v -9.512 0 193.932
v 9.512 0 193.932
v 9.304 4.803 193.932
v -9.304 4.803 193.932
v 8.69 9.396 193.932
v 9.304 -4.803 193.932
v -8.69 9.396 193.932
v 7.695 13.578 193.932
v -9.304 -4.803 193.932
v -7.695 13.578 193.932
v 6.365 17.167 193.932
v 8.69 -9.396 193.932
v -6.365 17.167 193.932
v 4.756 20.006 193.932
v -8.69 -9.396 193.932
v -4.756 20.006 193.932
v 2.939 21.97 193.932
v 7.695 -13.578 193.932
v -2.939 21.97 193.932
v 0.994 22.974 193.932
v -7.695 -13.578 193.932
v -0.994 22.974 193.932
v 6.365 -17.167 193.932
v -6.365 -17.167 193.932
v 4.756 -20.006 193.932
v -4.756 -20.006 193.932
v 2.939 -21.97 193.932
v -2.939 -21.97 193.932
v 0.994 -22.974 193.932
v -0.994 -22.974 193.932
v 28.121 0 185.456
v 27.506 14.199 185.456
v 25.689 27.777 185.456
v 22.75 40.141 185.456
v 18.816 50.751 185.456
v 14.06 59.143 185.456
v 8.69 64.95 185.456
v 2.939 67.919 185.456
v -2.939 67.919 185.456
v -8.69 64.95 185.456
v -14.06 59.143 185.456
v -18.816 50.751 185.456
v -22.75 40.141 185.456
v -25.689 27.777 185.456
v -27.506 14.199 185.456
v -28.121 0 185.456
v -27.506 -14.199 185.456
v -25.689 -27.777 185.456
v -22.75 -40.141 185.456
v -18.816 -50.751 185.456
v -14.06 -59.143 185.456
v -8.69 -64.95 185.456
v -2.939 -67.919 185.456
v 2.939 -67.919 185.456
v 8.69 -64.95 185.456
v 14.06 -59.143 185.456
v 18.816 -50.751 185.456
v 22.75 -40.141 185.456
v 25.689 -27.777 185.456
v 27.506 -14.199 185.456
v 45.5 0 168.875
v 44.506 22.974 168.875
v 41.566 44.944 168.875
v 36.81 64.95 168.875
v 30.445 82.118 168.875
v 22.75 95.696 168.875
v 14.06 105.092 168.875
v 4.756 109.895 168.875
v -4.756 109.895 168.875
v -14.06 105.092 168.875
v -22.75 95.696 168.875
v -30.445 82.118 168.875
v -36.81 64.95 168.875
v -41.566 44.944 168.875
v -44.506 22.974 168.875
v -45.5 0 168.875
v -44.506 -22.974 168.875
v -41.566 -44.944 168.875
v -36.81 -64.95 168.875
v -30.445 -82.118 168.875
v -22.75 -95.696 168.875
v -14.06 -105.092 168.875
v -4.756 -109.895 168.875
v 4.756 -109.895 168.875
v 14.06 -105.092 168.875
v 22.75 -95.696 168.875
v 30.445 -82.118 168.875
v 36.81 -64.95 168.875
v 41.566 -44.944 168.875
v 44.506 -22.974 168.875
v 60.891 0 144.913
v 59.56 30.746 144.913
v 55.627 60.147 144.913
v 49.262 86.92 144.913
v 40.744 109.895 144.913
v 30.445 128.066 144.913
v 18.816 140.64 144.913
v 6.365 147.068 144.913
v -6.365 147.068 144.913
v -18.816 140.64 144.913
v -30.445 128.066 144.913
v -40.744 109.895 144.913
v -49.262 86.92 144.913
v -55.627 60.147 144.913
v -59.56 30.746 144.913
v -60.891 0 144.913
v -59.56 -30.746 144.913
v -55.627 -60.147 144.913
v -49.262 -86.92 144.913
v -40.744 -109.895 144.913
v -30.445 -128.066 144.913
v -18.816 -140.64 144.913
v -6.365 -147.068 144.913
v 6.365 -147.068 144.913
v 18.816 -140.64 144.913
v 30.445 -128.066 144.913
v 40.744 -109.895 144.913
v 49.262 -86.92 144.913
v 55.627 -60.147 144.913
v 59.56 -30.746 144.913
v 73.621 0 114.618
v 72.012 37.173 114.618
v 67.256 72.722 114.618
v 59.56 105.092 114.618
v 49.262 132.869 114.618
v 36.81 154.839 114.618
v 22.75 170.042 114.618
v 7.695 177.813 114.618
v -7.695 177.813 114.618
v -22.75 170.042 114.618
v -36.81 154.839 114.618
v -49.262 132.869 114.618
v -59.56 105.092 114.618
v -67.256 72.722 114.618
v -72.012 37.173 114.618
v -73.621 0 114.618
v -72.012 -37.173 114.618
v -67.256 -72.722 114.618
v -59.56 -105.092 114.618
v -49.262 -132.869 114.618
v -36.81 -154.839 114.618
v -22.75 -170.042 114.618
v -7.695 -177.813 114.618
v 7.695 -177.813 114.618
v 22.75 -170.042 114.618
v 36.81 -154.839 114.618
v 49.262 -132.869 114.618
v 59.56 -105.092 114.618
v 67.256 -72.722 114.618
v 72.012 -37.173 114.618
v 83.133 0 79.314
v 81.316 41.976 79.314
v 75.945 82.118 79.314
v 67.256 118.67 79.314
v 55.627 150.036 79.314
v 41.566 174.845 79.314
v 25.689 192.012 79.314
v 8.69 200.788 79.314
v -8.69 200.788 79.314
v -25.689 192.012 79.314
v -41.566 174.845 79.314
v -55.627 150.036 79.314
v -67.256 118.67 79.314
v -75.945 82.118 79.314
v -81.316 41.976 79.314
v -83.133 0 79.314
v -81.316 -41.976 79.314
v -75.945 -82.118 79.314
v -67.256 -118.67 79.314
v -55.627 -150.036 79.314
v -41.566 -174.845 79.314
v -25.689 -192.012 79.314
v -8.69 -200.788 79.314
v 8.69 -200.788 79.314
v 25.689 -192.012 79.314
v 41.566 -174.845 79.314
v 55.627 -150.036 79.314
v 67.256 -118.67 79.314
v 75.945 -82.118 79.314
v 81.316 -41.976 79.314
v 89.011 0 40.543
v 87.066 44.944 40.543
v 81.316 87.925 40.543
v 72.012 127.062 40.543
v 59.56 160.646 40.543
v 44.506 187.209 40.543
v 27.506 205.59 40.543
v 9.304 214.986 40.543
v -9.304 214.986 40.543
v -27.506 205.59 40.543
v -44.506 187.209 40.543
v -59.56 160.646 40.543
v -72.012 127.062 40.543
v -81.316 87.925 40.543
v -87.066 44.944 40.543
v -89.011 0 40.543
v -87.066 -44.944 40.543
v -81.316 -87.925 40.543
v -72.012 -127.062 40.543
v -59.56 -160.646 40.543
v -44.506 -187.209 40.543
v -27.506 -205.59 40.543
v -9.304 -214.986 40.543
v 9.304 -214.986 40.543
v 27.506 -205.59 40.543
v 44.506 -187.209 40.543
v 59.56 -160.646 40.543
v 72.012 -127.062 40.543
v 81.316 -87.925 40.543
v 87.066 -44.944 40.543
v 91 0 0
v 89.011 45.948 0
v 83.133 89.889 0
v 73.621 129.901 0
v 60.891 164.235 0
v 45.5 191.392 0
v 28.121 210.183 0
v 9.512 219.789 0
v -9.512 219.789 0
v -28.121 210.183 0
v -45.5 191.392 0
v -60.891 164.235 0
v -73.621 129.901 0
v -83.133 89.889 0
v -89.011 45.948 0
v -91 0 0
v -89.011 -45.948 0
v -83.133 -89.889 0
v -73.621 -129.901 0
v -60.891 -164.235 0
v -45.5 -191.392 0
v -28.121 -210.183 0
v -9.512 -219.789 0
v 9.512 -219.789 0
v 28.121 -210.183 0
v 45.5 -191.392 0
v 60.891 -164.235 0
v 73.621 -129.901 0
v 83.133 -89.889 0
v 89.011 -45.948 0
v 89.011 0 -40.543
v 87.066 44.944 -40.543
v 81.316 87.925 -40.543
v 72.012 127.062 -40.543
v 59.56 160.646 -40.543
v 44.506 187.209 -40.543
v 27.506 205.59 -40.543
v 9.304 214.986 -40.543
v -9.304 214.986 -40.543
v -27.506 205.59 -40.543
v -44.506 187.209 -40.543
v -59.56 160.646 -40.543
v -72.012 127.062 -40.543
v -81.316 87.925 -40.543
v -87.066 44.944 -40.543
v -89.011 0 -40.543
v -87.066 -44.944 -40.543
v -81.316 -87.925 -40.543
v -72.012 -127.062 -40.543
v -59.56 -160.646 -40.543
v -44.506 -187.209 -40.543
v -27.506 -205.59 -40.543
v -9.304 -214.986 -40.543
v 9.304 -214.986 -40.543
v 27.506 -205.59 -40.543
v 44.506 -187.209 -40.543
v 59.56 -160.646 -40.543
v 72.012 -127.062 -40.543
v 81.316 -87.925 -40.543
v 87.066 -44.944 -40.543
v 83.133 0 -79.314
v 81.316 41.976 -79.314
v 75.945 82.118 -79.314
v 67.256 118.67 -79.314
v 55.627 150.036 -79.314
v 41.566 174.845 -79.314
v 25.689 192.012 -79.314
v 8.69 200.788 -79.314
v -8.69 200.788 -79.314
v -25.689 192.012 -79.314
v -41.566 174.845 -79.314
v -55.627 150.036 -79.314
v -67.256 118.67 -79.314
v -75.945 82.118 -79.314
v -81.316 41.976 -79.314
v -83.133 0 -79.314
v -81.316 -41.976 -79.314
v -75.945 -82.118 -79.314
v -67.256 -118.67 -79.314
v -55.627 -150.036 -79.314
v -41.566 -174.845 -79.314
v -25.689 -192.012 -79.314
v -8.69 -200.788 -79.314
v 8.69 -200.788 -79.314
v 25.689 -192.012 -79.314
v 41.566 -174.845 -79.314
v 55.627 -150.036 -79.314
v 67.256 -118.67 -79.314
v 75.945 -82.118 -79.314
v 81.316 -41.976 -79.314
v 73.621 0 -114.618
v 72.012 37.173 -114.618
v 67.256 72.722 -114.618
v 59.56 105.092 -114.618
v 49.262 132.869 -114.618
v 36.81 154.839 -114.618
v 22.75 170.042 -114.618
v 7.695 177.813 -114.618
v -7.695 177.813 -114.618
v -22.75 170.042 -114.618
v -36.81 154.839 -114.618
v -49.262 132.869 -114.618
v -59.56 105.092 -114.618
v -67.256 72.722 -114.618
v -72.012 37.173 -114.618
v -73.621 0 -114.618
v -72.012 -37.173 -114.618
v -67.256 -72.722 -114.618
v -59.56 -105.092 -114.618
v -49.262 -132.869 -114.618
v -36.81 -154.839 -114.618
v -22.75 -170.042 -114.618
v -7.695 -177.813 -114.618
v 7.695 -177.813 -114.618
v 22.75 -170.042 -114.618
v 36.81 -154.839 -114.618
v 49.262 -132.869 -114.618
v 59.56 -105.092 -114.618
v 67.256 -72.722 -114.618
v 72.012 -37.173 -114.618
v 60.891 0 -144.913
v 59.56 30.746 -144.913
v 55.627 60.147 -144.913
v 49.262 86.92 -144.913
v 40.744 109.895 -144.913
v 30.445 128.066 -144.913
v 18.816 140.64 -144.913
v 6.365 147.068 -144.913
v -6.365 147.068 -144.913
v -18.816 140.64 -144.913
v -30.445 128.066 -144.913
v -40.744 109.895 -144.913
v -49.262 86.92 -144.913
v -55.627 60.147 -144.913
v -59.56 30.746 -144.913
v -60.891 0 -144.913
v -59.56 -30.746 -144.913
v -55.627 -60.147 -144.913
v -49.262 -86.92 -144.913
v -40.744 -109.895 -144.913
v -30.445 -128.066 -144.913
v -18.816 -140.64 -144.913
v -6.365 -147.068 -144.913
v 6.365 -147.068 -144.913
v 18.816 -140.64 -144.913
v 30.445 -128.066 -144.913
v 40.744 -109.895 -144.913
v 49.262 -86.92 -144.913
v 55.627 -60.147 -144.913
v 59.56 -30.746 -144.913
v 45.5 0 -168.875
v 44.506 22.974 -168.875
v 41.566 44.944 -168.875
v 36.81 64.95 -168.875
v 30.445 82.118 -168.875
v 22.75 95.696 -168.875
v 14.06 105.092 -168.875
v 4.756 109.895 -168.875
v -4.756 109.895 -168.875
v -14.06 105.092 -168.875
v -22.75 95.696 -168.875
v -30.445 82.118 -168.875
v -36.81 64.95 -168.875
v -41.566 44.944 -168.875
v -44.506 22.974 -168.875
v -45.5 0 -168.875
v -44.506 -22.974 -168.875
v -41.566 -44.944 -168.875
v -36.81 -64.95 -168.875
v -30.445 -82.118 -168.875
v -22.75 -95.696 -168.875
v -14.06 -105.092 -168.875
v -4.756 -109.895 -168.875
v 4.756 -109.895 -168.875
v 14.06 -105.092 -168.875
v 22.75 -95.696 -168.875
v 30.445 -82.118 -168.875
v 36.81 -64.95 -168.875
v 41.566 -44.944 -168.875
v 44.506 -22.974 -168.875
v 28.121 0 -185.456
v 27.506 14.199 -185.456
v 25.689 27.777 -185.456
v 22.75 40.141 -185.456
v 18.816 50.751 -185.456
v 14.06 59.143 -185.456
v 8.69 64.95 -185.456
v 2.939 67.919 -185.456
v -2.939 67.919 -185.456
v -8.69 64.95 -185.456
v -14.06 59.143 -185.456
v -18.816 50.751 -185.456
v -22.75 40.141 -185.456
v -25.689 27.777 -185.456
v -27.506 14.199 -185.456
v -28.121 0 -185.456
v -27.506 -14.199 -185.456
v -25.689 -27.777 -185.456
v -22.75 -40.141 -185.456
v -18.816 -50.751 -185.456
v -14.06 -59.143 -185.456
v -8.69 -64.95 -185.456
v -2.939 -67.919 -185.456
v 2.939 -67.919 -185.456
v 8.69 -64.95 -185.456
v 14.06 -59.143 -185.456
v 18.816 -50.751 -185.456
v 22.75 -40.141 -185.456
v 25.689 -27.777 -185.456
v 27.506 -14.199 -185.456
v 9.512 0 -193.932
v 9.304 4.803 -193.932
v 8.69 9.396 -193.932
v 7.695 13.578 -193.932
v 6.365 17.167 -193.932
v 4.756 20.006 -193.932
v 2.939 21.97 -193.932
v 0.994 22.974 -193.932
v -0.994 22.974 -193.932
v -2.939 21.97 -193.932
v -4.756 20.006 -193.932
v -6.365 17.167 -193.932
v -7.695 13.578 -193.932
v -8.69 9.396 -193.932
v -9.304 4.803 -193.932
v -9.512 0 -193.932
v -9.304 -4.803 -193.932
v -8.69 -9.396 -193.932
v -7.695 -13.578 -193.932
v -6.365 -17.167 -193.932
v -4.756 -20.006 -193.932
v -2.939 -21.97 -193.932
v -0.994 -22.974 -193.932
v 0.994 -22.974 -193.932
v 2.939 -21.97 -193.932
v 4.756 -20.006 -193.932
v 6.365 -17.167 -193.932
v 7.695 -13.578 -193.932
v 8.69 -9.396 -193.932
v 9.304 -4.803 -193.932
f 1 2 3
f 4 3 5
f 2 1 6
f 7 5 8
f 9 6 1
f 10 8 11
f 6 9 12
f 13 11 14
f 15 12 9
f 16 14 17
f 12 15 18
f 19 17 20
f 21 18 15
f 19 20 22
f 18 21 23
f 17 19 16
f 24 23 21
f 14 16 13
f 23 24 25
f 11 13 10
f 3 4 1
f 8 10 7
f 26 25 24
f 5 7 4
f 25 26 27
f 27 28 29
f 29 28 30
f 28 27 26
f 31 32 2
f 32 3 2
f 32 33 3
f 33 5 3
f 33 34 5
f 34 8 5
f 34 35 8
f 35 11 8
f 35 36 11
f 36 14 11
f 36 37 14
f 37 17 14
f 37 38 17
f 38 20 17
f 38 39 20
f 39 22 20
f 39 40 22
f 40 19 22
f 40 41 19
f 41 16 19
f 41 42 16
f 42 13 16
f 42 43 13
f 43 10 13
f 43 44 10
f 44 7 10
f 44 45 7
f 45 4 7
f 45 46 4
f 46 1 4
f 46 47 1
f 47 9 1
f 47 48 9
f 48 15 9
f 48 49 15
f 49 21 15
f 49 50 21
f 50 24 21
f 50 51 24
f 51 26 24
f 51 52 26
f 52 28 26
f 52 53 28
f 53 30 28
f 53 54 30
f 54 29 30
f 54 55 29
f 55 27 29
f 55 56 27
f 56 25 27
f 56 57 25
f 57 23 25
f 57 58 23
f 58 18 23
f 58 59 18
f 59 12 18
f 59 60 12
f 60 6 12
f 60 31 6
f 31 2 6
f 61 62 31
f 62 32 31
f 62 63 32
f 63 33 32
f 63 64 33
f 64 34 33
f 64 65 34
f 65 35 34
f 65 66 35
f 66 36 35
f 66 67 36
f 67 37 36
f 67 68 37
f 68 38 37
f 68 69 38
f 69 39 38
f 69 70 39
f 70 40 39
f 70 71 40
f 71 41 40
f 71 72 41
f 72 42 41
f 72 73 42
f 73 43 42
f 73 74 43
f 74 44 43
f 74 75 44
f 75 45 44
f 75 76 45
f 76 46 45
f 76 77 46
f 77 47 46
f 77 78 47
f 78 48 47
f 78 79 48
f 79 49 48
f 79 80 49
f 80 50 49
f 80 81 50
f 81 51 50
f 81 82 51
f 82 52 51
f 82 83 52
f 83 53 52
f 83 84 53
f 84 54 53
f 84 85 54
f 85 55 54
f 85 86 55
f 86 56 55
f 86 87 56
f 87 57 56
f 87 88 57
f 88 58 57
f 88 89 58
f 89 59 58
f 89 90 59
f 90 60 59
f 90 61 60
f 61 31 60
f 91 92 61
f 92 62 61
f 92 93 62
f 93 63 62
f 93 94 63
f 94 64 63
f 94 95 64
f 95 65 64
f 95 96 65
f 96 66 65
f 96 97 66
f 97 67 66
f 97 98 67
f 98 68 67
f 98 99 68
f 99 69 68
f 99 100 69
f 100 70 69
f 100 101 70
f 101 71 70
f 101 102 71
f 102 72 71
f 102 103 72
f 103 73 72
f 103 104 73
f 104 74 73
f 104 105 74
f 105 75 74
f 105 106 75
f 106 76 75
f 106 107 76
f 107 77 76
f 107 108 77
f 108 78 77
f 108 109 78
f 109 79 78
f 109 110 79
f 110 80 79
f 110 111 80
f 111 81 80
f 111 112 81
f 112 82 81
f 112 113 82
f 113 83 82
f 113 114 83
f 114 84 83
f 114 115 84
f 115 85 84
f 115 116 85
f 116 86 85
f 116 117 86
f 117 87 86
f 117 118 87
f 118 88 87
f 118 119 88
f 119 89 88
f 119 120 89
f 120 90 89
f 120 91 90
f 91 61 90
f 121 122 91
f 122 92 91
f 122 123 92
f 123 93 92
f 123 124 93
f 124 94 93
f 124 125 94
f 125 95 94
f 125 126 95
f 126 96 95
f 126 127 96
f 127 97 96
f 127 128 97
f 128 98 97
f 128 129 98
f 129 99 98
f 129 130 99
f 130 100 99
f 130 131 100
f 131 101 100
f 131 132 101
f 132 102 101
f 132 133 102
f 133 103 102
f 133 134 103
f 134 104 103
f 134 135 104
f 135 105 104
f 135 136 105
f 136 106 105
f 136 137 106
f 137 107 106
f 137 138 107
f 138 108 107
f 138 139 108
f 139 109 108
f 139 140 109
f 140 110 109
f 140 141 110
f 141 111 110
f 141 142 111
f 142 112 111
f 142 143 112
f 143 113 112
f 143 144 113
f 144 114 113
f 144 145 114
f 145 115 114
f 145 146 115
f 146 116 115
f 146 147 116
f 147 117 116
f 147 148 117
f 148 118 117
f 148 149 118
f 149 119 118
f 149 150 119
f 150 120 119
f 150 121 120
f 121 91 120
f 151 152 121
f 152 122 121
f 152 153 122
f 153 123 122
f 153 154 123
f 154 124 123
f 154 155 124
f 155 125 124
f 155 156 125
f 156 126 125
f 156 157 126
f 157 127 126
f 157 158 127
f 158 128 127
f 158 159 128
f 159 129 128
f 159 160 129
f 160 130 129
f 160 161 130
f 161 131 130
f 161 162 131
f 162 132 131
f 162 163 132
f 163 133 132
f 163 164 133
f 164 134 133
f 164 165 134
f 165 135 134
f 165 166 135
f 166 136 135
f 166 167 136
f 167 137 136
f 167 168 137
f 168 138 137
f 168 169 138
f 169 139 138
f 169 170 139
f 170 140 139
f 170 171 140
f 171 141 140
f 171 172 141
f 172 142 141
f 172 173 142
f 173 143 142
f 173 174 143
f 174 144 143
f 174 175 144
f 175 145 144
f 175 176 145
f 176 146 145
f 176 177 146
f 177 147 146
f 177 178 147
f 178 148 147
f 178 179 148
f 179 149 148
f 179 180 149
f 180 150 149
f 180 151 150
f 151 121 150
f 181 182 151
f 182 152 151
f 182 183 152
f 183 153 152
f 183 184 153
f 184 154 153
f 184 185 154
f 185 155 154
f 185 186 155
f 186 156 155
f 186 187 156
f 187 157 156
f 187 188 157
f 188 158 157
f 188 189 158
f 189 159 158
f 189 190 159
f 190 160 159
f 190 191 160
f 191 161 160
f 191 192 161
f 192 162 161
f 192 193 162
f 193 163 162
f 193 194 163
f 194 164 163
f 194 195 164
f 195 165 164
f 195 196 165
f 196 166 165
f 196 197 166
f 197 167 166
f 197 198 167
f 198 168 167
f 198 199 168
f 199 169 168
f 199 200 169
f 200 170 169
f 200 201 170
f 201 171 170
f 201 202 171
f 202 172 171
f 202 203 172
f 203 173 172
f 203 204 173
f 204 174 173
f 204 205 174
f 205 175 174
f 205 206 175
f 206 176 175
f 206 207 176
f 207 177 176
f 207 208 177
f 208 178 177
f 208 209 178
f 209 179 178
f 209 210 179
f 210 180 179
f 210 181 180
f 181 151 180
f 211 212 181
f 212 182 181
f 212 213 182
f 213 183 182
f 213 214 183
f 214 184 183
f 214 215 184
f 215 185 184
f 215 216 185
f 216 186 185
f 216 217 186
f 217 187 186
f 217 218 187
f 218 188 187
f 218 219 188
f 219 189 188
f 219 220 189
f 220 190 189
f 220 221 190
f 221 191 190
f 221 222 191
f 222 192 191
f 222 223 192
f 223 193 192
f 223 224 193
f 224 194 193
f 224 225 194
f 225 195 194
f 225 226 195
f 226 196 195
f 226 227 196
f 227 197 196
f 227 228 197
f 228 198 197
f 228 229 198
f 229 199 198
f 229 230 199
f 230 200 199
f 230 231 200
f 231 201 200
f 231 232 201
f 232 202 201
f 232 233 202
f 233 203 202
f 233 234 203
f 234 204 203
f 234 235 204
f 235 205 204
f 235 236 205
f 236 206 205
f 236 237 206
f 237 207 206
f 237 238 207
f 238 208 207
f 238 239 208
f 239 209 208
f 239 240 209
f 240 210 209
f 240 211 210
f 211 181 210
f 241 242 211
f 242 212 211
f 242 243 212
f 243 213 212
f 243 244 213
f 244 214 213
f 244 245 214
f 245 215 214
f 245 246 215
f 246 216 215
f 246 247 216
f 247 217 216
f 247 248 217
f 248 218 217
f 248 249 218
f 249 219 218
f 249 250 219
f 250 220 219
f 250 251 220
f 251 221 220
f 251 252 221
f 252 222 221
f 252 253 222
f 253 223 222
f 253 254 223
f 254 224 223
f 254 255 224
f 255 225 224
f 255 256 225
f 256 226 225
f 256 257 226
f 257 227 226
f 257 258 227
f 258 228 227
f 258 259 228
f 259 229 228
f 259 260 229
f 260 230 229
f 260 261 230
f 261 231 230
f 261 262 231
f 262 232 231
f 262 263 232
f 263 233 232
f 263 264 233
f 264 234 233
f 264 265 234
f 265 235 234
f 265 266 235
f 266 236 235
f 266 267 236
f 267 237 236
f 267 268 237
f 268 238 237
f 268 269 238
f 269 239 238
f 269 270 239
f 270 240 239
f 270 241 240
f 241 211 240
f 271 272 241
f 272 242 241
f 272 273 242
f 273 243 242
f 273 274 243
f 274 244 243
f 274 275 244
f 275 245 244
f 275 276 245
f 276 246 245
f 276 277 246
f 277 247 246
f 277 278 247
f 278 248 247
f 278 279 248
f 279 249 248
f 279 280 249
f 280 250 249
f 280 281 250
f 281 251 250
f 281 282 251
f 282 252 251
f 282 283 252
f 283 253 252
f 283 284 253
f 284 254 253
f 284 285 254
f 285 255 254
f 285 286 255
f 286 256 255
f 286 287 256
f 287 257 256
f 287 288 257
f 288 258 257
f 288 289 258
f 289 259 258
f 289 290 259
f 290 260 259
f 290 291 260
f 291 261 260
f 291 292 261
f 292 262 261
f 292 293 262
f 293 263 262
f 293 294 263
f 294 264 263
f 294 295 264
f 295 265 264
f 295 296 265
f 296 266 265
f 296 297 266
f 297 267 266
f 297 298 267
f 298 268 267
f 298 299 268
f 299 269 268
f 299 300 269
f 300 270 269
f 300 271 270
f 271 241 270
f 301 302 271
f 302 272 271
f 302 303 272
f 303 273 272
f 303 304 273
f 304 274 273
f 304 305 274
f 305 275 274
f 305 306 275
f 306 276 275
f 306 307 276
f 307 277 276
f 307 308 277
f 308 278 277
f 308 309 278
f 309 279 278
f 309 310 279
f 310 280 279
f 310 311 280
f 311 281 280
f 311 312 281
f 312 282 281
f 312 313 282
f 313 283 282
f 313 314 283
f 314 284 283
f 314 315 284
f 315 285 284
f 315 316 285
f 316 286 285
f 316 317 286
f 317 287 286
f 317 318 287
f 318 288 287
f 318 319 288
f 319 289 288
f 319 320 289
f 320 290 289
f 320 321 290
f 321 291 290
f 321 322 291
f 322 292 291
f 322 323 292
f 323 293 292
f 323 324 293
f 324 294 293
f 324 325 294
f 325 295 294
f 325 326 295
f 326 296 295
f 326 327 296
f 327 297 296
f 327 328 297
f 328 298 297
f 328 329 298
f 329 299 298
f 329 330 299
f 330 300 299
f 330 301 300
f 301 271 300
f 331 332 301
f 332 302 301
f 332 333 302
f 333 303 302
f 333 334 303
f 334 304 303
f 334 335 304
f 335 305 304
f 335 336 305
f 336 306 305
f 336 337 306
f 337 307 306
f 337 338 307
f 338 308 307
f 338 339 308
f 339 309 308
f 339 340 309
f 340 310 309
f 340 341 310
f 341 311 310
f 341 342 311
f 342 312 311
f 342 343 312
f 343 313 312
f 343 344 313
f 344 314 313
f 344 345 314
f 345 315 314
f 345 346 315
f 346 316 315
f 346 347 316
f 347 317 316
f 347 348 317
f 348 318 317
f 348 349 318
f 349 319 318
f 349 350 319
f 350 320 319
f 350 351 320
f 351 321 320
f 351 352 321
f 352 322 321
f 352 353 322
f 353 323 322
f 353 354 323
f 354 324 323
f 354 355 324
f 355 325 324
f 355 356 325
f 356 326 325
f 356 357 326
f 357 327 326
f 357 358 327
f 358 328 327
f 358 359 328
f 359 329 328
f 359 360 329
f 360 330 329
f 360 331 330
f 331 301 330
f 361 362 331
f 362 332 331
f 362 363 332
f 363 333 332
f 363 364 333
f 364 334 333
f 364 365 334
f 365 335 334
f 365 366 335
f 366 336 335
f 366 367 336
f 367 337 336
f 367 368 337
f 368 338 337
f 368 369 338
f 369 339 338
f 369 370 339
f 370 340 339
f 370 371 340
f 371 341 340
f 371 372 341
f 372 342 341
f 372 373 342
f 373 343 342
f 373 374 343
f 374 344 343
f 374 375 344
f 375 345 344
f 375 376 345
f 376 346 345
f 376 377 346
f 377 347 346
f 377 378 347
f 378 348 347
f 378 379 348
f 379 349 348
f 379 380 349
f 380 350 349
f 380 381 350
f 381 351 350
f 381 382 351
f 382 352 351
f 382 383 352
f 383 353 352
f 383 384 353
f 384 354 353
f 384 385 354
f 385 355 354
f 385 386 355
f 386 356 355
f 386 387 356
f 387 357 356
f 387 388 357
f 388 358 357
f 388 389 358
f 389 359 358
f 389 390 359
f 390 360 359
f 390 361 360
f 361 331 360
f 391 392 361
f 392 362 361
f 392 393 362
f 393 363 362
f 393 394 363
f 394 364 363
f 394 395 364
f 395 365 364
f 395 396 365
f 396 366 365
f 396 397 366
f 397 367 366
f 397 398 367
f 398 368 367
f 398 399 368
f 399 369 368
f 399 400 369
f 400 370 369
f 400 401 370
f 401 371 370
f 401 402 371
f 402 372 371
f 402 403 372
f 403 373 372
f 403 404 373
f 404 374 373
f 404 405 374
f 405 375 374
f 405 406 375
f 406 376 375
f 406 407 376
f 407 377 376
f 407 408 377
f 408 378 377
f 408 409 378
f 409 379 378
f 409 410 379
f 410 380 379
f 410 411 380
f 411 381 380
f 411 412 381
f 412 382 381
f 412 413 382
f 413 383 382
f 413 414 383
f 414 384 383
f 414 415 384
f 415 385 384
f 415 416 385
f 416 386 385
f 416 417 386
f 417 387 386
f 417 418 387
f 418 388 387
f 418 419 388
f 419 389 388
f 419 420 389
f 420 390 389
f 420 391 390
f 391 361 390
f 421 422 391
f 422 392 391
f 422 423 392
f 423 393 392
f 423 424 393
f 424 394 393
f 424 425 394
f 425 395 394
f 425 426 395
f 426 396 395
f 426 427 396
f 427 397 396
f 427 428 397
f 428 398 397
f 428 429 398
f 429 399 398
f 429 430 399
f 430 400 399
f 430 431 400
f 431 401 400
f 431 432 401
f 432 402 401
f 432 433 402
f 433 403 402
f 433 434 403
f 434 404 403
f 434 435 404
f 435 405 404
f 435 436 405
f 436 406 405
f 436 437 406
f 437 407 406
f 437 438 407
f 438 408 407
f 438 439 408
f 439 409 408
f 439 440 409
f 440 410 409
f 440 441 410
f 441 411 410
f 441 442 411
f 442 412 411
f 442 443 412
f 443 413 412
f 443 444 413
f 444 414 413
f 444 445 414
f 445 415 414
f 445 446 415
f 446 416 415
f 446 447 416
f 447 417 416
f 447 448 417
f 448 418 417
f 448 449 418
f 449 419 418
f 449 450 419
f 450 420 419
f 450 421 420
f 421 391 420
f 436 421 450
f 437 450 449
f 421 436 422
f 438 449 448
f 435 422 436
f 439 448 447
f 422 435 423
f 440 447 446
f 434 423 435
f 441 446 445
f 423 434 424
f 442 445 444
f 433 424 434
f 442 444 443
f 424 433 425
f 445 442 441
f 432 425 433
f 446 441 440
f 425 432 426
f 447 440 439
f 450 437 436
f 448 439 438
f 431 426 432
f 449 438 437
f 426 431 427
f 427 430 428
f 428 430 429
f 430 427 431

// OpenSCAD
// Generated by SolidPython 1.0.1 on 2020-07-29 00:46:48


scale(v = [7, 17, 15]) {
	sphere(r = 13);
}
/***********************************************
*********      SolidPython code:      **********
************************************************
 
# import packages: SolidPython
from solid import *
from solid.utils import *
from itertools import chain, combinations, permutations


class Resize:

    def __init__(self, scad_file):
        self.scad_file = scad_file
        #self.scad_file = import_scad(scad_file)
        # cone/cylinder param:
        self.r1 = 0
        self.r2 = 0
        self.h = 0
        # rectangular prism param:
        self.w = 0
        self.l = 0
        # ellipse param:
        self.r = 0

    # import OpenScad code (file name corresponds to shape)


    # classify shape + parameters
    def assign(self, param1, param2, param3):
        if self.scad_file == 'cone.scad':
            self.r1 = param1
            self.r2 = param2
            self.h = param3
        elif self.scad_file == 'cylinder.scad':
            self.r1 = param1
            self.r2 = param2
            self.h = param3
        elif self.scad_file == 'rectangularPrism.scad':
            self.h = param1
            self.l = param2
            self.w = param3
        else:
            self.r = param1
            self.h = param2

    # resize parameters
    def iterate(self):
        x = range(3, 20, 2)
        i = 1
        if self.scad_file == 'cone.scad':
            tempList = list(permutations(x, 2))
            for temp in tempList:
                param1 = temp[0]
                param2 = temp[1]
                filepath = 'produced_scad_files/' + 'cone' + str(param1) + '_' + str(param2) + '_' + '.scad'
                scad_render_to_file(cylinder(h=param1, r1=param2, r2=0), filepath)

        elif self.scad_file == 'cylinder.scad':
            tempList = list(permutations(x, 3))
            for temp in tempList:
                param1 = temp[0]
                param2 = temp[1]
                filepath = 'produced_scad_files/' + 'cylinder' + str(param1) + '_' + str(param2) + '_' + '.scad'
                scad_render_to_file(cylinder(h=param1, r1=param2, r2=param2), filepath)

        elif self.scad_file == 'rectangularPrism.scad':
            tempList = list(permutations(x, 3))
            for temp in tempList:
                param1 = temp[0]
                param2 = temp[1]
                param3 = temp[2]
                filepath = 'produced_scad_files/' + 'rectangularPrism' + str(param1) + '_' + str(param2) + '_' + str(
                    param3) + '.scad'
                scad_render_to_file(cube(size=(param1, param2, param3)), filepath)

        elif self.scad_file == 'ellipse.scad':
            tempList = list(permutations(x, 4))
            for temp in tempList:
                param1 = temp[0]
                param2 = temp[1]
                param3 = temp[2]
                param4 = temp[3]
                filepath = 'produced_scad_files/' + 'ellipse' + str(param1) + '_' + str(param2) + '_' + str(param3) + '_' + str(param4) + '.scad'
                scad_render_to_file(scale([param1, param2, param3])(sphere(r=param4)), filepath)

    def render_to_scadfile(self):
        scad_render_to_file(scad, 'example.scad') 
 
************************************************/
